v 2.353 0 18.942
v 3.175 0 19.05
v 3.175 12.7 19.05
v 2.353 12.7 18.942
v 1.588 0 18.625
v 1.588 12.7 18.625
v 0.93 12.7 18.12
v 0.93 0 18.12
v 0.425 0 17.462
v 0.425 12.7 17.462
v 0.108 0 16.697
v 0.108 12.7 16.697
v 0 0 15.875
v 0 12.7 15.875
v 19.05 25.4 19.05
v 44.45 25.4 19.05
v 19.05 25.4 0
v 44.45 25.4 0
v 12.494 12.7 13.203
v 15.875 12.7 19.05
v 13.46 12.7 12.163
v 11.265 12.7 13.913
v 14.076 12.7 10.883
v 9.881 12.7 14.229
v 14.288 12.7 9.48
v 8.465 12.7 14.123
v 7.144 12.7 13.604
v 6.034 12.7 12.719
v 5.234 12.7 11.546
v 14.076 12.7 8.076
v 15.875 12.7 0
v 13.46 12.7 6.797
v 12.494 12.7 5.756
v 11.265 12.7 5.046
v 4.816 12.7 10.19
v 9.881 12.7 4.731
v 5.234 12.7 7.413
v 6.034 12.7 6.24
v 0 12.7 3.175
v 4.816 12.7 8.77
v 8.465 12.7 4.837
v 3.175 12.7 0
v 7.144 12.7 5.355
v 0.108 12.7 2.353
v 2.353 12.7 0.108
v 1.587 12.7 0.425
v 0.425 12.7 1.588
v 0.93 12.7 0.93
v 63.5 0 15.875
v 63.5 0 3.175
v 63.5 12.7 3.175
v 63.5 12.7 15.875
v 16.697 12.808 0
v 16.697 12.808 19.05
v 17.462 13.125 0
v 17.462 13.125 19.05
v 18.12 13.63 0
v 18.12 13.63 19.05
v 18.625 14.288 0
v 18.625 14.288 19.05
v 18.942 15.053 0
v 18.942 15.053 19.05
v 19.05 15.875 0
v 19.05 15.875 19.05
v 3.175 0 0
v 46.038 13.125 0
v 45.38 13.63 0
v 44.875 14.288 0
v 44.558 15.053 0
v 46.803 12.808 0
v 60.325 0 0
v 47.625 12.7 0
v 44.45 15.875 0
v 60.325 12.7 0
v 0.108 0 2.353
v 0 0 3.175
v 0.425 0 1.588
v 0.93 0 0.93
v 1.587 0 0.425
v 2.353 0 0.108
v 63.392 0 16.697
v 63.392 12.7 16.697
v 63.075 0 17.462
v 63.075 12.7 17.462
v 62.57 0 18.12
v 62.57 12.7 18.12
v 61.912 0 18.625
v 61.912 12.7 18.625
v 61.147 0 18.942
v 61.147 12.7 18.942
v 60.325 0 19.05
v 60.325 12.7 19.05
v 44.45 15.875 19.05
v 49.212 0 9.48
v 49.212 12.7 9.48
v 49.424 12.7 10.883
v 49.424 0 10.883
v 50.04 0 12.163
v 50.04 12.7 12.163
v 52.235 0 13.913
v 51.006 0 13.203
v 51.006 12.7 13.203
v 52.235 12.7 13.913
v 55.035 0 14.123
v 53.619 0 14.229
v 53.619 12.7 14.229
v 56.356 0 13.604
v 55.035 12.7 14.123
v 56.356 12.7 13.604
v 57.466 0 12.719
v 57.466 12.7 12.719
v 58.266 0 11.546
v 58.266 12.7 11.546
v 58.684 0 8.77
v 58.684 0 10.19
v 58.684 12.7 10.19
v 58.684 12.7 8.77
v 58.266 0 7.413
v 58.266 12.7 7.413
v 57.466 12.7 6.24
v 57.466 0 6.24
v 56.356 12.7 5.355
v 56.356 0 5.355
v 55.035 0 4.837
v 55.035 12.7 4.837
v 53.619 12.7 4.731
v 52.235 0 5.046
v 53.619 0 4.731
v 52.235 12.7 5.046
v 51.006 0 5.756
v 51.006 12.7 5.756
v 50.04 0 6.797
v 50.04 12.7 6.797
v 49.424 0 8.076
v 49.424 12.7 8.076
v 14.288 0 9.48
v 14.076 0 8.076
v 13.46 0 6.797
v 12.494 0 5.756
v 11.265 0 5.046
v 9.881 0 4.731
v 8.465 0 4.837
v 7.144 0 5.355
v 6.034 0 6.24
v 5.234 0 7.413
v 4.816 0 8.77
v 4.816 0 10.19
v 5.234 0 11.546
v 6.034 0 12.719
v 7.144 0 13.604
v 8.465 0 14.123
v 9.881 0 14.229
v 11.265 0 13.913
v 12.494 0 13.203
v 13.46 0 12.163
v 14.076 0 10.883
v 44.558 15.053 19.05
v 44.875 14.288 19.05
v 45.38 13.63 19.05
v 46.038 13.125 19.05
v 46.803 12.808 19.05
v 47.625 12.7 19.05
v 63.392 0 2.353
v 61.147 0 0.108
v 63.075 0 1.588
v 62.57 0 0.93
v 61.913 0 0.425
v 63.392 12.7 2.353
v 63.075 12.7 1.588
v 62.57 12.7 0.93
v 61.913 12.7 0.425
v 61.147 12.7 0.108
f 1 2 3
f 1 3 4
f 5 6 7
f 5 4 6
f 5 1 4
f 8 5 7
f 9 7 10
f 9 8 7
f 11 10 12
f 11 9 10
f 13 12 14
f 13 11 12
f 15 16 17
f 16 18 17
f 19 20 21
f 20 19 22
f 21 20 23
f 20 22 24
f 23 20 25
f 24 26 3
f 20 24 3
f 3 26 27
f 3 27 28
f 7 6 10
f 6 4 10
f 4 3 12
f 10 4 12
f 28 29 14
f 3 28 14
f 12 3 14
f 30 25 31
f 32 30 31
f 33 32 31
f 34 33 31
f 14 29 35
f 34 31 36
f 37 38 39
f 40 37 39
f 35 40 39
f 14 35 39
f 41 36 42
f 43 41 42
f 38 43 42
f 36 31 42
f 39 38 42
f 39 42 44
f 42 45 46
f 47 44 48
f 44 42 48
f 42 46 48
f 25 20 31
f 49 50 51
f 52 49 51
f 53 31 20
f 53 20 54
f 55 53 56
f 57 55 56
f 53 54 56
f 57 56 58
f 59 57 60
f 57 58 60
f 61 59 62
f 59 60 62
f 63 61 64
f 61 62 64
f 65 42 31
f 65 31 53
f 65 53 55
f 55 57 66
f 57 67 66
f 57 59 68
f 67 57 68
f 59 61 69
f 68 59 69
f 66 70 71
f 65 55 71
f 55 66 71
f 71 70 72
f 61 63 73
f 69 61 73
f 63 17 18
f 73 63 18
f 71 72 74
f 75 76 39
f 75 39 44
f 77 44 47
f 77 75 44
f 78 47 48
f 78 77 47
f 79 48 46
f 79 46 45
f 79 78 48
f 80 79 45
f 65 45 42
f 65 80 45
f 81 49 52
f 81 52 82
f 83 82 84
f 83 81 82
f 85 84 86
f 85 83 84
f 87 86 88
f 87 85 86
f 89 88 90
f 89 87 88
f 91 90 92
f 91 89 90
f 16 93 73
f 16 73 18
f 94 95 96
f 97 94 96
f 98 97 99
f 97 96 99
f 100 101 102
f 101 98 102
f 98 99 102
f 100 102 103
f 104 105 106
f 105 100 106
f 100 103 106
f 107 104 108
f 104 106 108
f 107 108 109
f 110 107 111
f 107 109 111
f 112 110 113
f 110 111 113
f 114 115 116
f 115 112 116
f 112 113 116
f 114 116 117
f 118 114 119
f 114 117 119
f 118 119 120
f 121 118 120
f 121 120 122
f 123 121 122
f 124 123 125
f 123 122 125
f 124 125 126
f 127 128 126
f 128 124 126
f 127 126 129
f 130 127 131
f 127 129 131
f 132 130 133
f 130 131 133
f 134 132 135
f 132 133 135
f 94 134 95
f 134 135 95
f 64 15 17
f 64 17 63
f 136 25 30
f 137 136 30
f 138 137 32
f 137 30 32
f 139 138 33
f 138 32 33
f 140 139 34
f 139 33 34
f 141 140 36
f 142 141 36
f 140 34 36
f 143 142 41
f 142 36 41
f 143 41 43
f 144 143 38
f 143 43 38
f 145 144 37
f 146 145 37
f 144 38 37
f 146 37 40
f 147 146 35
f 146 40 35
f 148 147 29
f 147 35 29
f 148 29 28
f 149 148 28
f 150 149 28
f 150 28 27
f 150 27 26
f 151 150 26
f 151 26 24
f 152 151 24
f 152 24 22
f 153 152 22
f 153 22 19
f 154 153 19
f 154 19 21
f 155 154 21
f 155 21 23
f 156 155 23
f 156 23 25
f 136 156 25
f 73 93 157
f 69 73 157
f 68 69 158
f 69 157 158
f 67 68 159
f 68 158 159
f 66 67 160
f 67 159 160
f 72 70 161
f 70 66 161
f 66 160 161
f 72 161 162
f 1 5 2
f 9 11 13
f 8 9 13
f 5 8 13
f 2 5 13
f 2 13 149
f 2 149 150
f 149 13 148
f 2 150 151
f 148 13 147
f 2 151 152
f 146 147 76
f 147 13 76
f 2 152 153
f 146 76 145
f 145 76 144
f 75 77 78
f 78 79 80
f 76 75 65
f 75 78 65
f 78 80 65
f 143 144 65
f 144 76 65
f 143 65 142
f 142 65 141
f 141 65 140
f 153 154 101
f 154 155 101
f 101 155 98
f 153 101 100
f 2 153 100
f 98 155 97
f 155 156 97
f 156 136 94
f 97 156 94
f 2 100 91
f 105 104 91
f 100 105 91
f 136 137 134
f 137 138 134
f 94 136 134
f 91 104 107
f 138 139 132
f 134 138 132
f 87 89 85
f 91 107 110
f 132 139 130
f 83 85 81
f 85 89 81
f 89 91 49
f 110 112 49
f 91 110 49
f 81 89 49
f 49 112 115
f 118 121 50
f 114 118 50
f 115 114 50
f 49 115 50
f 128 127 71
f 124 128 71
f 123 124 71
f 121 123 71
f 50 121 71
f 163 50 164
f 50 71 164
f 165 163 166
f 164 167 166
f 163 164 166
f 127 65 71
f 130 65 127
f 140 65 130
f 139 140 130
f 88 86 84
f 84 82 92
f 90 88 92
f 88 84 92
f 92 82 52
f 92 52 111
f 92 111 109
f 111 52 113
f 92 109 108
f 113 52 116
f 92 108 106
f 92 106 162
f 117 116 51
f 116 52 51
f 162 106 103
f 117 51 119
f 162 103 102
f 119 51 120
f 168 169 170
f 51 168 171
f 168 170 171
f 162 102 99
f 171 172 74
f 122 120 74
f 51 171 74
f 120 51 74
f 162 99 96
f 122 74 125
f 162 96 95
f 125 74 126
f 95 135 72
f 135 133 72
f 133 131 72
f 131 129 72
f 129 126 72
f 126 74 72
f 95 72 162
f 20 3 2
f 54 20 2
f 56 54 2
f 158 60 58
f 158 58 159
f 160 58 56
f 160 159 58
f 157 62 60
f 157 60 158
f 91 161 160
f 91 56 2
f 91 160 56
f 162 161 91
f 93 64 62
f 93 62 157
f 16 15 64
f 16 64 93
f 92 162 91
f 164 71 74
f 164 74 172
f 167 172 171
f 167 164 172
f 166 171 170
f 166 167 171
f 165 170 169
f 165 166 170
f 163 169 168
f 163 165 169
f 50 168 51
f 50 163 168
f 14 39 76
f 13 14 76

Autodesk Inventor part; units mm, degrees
ref_plane "YZ Plane" through (0, 0, 0) normal (1, 0, 0) x (0, 1, 0)
ref_plane "XZ Plane" through (0, 0, 0) normal (0, 1, 0) x (-1, 0, 0)
ref_plane "XY Plane" through (0, 0, 0) normal (0, 0, 1) x (1, 0, 0)
sketch "Sketch1" plane through (0, 0, 0) normal (0, 0, 1) x (1, 0, 0)
  line L0 (0, 0) -> (31.75, 0)
  line L1 (31.75, 0) -> (31.75, 25.4)
  line L2 (31.75, 25.4) -> (19.05, 25.4)
  line L3 (19.05, 25.4) -> (19.05, 12.7)
  line L4 (19.05, 12.7) -> (0, 12.7)
  line L5 (0, 12.7) -> (0, 0)
  dimension "d0" = 31.75
  dimension "d1" = 25.4
  dimension "d2" = 12.7
  dimension "d3" = 12.7
extrude "Extrusion1" add sketch "Sketch1" along normal blind 19.05
fillet "Fillet1" radius 3.175 3 edges at (0, 6.35, 19.05) (19.05, 12.7, 9.525) (0, 6.35, 0)
sketch "Sketch2" plane through (3.175, 12.7, 0) normal (0, 1, 0) x (1, 0, 0)
  line L0 (15.875, 0) -> (12.7, 0) projected
  circle A0 centre (6.35, -9.4797) radius 4.7625
  point P0 (-3.175, 0)
  dimension "d7" = 9.525
extrude "Extrusion2" cut sketch "Sketch2" against normal blind 12.7
mirror "Mirror1" about plane through (31.75, 0, 0) normal (1, 0, 0) of "Extrusion1", "Extrusion2", "Fillet1"
properties part number "Mirror 3D"
